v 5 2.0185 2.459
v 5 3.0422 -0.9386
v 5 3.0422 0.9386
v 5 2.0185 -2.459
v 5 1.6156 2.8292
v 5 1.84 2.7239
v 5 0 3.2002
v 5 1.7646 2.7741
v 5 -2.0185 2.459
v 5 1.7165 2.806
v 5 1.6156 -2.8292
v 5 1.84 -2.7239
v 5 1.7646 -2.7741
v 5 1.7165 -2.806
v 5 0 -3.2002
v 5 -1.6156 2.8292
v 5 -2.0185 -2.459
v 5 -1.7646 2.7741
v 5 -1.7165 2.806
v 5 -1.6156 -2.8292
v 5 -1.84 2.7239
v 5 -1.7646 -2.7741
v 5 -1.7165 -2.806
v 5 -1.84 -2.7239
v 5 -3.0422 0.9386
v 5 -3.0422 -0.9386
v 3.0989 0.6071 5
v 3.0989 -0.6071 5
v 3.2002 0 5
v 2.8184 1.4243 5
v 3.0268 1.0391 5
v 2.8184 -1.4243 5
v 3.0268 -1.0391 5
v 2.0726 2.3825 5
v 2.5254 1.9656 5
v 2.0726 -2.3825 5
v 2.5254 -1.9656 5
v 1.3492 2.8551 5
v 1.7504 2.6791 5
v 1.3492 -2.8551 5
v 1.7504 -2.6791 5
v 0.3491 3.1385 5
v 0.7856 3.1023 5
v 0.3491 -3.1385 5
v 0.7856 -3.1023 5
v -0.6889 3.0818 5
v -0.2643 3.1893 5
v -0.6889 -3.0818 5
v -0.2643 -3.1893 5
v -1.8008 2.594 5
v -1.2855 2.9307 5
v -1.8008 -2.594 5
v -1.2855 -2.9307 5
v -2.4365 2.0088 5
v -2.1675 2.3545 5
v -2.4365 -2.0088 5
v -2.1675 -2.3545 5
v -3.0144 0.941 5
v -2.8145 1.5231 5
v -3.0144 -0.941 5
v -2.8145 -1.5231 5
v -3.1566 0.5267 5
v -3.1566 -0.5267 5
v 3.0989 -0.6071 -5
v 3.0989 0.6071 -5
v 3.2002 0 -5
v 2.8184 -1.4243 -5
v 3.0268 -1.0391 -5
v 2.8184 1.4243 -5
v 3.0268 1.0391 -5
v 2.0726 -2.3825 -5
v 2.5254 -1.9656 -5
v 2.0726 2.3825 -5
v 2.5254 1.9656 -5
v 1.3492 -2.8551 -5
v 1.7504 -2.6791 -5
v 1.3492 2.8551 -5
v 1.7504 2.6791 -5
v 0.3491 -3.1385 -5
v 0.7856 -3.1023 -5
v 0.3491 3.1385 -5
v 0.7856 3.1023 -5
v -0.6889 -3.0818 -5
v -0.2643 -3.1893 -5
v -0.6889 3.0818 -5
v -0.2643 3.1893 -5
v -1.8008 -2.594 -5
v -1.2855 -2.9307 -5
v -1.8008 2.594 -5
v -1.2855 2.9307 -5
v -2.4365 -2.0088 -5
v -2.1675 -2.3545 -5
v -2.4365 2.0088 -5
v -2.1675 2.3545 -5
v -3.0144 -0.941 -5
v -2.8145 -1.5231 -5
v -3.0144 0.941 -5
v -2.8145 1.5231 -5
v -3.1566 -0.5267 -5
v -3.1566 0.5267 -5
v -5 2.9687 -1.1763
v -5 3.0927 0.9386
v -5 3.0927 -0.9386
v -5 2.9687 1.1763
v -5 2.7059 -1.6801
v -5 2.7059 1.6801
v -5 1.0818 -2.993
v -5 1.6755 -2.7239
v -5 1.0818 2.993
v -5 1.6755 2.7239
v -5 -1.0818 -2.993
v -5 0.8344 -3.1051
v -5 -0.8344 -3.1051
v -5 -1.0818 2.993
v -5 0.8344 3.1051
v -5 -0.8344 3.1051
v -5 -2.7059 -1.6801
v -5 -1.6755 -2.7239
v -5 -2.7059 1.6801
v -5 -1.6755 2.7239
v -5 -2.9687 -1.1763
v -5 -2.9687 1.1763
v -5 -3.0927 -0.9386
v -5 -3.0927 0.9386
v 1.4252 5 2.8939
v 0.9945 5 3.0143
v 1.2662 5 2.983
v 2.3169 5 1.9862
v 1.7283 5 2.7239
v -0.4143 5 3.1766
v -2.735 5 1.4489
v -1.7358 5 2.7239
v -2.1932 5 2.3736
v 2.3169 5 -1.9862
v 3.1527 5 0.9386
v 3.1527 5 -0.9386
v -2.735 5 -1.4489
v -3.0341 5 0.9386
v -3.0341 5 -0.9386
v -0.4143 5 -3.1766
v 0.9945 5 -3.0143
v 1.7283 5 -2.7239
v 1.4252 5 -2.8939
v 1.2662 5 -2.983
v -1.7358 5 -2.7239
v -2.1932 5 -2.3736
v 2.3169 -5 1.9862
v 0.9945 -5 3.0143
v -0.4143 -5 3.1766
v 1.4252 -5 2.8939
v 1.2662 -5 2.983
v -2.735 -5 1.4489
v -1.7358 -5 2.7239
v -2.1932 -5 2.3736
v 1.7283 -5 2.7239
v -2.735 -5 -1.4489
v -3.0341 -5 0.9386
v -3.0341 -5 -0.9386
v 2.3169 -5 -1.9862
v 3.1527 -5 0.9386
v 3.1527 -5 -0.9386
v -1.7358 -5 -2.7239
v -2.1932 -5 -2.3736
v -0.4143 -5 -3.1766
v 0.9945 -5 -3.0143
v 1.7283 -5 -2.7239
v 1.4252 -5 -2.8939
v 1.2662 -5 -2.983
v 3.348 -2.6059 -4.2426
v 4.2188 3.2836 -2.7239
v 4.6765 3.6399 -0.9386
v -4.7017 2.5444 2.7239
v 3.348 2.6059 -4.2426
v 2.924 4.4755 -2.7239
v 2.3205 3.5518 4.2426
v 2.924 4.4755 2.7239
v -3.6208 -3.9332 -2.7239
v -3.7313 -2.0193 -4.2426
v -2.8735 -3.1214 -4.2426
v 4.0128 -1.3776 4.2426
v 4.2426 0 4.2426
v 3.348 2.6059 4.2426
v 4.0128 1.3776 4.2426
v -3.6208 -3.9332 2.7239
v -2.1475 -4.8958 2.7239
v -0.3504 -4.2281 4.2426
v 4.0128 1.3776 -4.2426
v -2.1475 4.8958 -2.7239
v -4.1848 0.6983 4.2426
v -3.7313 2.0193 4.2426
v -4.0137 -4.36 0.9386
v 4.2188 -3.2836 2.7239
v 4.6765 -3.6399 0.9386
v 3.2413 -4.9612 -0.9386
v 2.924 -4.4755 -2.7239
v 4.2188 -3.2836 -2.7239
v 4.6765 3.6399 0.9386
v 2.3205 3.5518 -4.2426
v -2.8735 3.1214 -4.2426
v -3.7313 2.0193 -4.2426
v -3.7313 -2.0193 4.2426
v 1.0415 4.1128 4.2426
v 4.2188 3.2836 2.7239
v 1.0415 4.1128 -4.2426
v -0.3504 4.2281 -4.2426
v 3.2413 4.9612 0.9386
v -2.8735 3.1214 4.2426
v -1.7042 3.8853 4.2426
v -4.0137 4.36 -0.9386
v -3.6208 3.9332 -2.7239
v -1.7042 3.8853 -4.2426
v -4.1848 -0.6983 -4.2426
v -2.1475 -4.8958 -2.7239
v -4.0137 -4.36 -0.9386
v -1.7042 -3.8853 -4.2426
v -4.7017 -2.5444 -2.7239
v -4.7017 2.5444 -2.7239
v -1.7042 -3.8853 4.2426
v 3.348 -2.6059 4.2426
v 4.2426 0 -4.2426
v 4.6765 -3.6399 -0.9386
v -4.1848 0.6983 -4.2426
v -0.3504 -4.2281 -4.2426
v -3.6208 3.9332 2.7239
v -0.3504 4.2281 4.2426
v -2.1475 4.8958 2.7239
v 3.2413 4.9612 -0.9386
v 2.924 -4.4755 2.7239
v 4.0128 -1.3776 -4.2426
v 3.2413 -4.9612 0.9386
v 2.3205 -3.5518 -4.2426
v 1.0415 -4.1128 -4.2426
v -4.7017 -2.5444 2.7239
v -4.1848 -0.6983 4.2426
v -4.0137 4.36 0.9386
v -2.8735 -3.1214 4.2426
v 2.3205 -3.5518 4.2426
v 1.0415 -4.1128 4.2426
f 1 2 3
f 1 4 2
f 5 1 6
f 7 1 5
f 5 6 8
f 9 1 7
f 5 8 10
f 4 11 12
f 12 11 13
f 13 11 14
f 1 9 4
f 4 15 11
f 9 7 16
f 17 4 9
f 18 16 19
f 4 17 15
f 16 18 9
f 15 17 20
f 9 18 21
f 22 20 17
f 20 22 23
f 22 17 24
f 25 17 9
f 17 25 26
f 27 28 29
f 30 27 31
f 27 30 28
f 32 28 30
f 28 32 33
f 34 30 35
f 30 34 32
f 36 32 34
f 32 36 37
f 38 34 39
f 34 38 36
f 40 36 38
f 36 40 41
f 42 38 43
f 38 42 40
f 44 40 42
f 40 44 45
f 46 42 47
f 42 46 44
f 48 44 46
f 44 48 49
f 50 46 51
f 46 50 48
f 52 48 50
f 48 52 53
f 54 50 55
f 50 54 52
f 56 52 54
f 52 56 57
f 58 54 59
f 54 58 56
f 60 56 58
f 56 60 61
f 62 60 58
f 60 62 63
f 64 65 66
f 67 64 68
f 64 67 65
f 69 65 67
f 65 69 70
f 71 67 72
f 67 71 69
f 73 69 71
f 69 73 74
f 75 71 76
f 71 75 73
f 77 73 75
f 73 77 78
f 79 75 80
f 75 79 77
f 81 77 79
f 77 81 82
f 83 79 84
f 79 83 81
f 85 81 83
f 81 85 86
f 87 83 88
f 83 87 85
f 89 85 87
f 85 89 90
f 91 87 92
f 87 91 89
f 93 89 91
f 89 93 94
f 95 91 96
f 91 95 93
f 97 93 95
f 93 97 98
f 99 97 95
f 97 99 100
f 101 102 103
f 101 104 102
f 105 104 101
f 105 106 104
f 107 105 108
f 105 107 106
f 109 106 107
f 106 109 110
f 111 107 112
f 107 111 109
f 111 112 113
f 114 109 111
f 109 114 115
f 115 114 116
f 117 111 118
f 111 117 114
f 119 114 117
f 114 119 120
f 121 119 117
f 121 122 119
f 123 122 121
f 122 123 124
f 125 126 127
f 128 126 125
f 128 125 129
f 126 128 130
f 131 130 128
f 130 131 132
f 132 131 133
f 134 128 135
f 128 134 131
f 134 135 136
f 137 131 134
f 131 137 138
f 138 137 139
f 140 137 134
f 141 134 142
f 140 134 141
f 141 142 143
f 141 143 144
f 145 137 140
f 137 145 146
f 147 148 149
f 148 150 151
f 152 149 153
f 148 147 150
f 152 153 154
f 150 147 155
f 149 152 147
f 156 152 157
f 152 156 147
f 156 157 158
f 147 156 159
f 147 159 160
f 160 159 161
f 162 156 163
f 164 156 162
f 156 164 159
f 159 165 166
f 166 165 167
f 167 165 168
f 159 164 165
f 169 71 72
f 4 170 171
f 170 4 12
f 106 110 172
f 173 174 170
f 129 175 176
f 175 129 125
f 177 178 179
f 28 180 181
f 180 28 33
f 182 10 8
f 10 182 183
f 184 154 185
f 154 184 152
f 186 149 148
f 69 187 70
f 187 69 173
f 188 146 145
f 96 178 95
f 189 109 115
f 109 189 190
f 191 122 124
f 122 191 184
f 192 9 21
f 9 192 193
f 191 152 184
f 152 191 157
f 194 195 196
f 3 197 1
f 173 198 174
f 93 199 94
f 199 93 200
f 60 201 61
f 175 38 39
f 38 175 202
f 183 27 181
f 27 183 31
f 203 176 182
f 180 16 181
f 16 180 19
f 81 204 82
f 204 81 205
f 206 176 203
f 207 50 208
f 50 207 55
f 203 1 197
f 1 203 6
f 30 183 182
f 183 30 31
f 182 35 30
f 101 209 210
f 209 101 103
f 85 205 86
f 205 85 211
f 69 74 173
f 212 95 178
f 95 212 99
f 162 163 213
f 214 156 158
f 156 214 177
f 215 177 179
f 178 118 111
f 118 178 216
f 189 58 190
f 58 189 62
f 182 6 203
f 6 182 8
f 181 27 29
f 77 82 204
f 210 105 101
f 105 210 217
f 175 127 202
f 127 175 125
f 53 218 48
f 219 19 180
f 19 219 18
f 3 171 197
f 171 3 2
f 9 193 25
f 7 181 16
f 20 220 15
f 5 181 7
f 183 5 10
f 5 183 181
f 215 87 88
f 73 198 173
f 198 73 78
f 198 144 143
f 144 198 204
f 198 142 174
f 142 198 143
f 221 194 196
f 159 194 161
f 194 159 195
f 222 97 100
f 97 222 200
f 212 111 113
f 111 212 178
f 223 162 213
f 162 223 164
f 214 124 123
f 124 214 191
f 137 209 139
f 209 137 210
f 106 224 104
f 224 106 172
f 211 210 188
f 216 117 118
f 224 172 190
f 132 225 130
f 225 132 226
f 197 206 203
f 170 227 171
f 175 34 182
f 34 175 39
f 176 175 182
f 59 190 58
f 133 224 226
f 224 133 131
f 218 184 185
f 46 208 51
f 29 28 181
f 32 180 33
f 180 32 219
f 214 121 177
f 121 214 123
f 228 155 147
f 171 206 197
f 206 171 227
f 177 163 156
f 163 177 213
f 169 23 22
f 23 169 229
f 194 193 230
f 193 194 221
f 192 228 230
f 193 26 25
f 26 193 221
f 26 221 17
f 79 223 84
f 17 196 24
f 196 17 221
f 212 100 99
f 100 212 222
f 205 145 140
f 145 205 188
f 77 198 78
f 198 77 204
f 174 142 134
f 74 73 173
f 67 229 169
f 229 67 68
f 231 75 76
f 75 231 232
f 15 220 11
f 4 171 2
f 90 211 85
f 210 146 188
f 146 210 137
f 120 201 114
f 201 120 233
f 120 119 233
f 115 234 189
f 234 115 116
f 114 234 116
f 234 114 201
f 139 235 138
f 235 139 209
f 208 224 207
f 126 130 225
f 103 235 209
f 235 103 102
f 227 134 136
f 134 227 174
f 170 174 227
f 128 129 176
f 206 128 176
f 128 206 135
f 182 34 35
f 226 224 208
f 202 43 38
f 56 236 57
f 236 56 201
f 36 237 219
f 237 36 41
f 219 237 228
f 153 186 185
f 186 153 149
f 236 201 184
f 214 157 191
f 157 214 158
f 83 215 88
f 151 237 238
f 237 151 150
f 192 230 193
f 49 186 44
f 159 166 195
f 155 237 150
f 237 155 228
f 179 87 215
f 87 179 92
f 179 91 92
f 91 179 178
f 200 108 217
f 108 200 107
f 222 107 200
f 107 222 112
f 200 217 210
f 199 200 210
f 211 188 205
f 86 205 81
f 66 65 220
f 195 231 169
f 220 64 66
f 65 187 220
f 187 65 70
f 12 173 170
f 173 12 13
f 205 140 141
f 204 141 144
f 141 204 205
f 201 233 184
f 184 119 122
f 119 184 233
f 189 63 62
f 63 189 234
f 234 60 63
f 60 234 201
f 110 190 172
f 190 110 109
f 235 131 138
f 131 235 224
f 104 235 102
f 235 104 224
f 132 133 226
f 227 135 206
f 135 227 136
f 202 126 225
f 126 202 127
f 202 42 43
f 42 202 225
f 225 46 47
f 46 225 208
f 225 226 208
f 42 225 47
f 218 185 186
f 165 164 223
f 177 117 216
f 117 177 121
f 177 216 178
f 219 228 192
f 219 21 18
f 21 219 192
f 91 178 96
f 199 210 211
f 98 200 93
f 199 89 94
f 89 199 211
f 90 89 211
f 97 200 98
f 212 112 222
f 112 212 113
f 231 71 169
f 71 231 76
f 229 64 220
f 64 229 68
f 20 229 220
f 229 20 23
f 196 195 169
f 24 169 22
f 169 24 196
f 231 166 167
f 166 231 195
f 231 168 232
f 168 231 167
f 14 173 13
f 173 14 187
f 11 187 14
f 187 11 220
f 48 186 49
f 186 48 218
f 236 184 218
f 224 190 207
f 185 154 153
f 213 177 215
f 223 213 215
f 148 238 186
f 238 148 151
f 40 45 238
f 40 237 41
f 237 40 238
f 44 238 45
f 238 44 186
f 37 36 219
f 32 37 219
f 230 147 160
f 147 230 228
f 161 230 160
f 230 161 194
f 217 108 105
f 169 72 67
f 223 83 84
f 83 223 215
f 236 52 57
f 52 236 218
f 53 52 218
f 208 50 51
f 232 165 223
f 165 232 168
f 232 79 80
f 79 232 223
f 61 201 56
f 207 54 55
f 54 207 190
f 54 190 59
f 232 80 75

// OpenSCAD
// Size of the cube (all directions)
cubSiz = 10;

// Radius of the Sphere
sRad = 6;

// The intersection of Cube and Sphere
// The part that both shapes have in common
intersection(){
    cube(size = [cubSiz, cubSiz, cubSiz], center = true);
    sphere(r = sRad);
}
